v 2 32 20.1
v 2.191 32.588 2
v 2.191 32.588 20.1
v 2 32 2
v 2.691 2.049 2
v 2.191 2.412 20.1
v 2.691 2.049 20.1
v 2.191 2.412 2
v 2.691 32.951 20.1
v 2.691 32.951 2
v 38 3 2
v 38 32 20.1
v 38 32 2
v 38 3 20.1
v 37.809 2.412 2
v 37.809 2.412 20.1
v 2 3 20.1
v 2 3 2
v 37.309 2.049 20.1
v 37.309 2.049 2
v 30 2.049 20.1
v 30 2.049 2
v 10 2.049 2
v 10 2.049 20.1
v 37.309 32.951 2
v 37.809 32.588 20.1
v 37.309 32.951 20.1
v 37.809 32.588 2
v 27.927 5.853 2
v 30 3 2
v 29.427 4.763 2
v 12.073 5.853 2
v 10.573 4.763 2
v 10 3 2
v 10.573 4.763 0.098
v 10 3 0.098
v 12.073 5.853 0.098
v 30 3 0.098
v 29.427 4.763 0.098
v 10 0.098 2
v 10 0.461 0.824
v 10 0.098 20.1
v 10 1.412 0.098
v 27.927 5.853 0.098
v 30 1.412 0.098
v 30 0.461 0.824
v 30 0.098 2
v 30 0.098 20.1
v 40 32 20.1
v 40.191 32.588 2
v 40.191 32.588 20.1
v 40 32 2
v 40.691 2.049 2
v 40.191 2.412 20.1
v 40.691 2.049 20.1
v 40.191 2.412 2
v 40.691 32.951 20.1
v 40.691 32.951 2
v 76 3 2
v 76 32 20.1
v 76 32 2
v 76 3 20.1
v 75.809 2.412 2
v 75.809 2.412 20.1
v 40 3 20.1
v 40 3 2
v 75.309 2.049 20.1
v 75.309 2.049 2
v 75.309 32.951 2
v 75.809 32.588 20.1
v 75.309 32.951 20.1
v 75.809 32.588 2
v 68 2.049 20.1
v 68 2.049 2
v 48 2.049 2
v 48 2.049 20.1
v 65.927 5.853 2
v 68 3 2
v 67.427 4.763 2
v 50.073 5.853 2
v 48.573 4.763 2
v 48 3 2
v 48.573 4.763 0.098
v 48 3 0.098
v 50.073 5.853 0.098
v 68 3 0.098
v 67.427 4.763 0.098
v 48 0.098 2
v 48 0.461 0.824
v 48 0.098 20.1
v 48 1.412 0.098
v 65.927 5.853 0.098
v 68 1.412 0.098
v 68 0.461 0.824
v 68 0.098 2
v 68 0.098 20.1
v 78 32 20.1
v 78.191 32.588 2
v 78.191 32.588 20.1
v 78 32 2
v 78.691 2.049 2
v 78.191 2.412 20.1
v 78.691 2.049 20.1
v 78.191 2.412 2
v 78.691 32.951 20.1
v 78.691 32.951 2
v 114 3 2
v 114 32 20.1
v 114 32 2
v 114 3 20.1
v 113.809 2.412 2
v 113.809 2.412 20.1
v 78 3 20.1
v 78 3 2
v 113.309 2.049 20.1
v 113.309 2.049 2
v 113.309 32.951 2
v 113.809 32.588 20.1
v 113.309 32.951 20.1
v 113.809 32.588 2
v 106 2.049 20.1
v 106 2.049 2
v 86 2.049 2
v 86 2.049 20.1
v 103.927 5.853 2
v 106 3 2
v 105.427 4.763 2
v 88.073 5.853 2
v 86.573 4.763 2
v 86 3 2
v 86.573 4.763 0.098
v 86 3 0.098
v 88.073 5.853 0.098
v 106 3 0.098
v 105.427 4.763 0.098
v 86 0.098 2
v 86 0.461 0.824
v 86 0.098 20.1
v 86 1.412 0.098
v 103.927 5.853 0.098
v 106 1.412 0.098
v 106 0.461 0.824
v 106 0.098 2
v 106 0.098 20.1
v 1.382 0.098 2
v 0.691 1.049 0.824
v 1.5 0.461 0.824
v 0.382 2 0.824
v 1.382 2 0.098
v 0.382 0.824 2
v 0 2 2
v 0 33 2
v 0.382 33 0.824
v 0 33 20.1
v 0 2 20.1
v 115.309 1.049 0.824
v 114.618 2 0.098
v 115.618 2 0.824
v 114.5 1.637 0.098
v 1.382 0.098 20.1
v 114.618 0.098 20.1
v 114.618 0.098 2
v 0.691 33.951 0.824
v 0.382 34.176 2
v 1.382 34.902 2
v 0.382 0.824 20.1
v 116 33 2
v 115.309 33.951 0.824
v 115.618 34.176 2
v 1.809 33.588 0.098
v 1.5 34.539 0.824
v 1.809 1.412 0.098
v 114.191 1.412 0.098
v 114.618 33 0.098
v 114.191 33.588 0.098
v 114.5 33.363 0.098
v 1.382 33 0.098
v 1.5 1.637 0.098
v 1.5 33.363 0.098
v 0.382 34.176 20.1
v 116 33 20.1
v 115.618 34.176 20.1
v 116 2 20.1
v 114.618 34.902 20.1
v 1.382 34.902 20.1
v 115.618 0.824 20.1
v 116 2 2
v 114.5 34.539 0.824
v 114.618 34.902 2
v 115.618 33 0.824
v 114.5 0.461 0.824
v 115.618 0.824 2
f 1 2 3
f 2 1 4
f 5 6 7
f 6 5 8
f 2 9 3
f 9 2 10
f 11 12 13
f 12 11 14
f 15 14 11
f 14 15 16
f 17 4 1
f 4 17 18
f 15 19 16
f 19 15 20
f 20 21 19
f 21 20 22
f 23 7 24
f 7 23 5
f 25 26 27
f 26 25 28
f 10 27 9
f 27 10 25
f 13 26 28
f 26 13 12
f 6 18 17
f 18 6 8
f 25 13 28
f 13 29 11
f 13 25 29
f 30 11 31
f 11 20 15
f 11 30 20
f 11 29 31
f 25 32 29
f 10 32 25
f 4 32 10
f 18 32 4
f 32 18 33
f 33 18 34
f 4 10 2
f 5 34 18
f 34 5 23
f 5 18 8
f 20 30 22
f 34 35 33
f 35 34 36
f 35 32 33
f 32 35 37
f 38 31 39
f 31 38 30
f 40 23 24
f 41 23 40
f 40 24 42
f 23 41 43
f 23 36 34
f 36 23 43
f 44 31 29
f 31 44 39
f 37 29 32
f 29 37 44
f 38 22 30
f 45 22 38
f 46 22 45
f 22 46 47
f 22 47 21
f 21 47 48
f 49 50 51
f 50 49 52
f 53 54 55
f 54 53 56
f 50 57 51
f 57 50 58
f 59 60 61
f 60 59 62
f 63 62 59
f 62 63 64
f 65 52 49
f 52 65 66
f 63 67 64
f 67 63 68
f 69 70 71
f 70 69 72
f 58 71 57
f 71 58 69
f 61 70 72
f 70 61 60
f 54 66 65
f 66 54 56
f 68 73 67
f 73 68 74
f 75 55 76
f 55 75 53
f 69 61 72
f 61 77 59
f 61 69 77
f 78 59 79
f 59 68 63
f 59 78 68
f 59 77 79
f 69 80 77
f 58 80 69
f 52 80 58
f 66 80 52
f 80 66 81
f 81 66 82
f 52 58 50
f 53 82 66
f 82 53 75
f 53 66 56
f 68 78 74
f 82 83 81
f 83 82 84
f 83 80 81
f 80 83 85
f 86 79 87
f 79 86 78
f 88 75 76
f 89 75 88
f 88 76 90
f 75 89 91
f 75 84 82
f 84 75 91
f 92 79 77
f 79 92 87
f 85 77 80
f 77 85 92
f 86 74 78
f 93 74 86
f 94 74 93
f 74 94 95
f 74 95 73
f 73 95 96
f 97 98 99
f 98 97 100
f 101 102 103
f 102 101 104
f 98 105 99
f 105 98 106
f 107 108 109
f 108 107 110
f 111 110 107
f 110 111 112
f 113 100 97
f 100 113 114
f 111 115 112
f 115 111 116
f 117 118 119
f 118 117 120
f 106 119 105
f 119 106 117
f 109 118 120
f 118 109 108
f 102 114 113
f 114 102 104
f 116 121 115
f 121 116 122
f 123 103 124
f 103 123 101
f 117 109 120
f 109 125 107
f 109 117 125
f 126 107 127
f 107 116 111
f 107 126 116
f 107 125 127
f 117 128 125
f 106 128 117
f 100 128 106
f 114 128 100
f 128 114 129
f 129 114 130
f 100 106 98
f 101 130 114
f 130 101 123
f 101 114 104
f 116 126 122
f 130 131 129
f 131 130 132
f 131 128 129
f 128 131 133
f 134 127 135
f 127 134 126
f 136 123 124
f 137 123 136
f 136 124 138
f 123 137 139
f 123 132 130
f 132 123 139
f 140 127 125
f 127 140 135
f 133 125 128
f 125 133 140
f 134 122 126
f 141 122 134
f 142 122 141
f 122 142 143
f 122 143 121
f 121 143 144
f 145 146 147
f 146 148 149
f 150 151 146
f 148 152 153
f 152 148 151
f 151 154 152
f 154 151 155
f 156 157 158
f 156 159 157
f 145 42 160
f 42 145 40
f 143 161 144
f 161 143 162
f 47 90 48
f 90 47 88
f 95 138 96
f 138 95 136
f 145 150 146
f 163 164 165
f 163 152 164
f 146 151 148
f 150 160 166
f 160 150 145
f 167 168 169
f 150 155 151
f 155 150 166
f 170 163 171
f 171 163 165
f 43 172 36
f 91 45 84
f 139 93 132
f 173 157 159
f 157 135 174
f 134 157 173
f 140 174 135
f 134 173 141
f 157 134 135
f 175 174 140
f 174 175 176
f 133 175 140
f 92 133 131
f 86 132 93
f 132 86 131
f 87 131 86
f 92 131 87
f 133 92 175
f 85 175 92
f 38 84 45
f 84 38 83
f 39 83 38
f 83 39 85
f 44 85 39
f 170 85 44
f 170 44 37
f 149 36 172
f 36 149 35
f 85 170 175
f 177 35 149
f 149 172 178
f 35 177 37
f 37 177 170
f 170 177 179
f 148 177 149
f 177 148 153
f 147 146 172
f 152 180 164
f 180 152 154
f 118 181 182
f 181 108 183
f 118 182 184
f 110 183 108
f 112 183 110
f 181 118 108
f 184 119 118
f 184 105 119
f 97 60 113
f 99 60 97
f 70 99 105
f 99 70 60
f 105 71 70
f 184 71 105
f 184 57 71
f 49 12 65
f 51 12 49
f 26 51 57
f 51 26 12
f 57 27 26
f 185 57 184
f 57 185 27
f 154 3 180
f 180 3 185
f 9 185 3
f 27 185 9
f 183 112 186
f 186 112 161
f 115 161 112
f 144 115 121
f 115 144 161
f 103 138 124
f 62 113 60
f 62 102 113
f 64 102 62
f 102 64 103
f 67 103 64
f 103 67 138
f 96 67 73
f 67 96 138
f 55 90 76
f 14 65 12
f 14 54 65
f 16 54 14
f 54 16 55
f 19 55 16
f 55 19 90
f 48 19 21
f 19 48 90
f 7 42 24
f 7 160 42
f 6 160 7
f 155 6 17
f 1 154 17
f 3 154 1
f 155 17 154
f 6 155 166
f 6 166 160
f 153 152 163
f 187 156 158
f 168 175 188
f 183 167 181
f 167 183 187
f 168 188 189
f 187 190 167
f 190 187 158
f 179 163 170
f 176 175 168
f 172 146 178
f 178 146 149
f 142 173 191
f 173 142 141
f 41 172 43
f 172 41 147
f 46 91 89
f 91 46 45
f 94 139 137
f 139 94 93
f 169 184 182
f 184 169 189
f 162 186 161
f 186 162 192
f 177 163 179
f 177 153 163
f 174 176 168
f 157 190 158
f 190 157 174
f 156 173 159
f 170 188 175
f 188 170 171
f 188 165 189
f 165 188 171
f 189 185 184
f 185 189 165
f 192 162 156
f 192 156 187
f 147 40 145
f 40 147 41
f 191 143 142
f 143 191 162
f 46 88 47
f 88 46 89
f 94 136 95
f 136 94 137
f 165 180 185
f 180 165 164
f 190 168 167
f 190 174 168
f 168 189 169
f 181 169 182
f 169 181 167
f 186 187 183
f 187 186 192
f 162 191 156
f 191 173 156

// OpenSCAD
// file: ../../lib/rounded_square.scad
$bleed = 1;
$rounding = 3;

module rounded_square(size, flat_top=false, flat_bottom=false) {
  assert(!(flat_top && flat_bottom), "Flat top and flat bottom are exclusive");

  rounding_height = flat_top || flat_bottom 
    ? $rounding 
    : $rounding * 2;

  offset = flat_bottom ? 0 : $rounding;

  inner_size = [
    size[0] - $rounding * 2,
    size[1] - rounding_height,
  ];

  minkowski() {
    translate([$rounding, offset]) {
      square(inner_size);
    }
    if (flat_top ) {
      difference() {
        circle($rounding);
        translate([-$rounding, 0]) {
          square([$rounding * 2, $rounding]);
        }
      }
    } else if (flat_bottom) {
      difference() {
        circle($rounding);
        translate([-$rounding, -$rounding]) {
          square([$rounding * 2, $rounding]);
        }
      }
    } else {
      circle($rounding);
    }
  }
}
// file: ../../lib/rounded_cube.scad
include <./rounded_square.scad>

$bleed = 1;
$rounding = 3;

// Render a rounded cube
// flat_top: do not round the top edges
// flat_bottom: do not round the bottom edges
// flat: equals flat_top && flat_bottom
// 
// Limitations:
// requires height > $rounding * 2
// flat_top || flat_bottom requires height > $rounding
// flat_top && flat_bottom requires height > $bleed
module rounded_cube(
  size, 
  flat=false, 
  flat_top=false, 
  flat_bottom=false,
  side_rounding=-1
) {
  _flat_top = flat_top || flat;
  _flat_bottom = flat_bottom || flat;
  _side_rounding = side_rounding > -1 ? side_rounding: $rounding;

  top_height = _flat_top ? 0: $rounding;
  bottom_height = _flat_bottom ? 0: $rounding;

  echo ("side rounding:", _side_rounding);
  echo("rounding:", $rounding);

  cube_size = [
    size[0] - $rounding * 2,
    size[1] - $rounding * 2,
    size[2] - (top_height + bottom_height)
  ];

  if (_flat_top && _flat_bottom) {
     linear_extrude(cube_size[2]) {
       rounded_square([size[0], size[1]]);
     }
   } else {
     minkowski() {
       translate([$rounding, $rounding, bottom_height]) {
         if (_side_rounding != $rounding) {
           linear_extrude(cube_size[2]) {
             rounded_square([cube_size[0], cube_size[1]], $rounding=_side_rounding);
           }
         } else {
           cube(cube_size);
         }
       }
       if (_flat_top) {
         difference() {
           sphere($rounding);
           cylinder($rounding, $rounding, $rounding);
         }
       } else if (_flat_bottom) {
         difference() {
           sphere($rounding);
           translate ([0, 0, -$rounding]) {
             cylinder($rounding, $rounding, $rounding);
           }
         }
       } else {
         sphere($rounding);
       }
    }
  }
}
// main file
echo(version=version());

include <../../lib/rounded_cube.scad>

// Config
// $fn = 50;
$fn = 10;
$wall_thickness = 2;
$bleed = 0.01;
tile_gap = 0.5;

tile_cols = 3;
order_tile_count = 8;

order_tile_size = [
  35, 
  30, 
  2.2,
];
order_height = order_tile_size[2] * order_tile_count + tile_gap;

cutout_size = [
  order_tile_size[0] + tile_gap * 2,
  order_tile_size[1] + tile_gap * 2,
  order_height + $bleed,
];

box_size = [
  cutout_size[0] * tile_cols + $wall_thickness * (tile_cols + 1),
  cutout_size[1] + $wall_thickness * 2,
  order_height + $wall_thickness,
];

col_width = cutout_size[0] + $wall_thickness * 2;

cutout_fraction = 0.5;
side_cutout = [
  col_width * cutout_fraction,
  box_size[1] * cutout_fraction,
  box_size[2] + $bleed * 2,
];
side_cutout_width_offset = (col_width - side_cutout[0]) / 2;
side_cutout_length_offset = (box_size[1] - side_cutout[1]) / 2;
inset = 6;

difference() {
  rounded_cube(box_size, flat_top=true, $rounding=2);

  for(i=[0:tile_cols-1]) {
    translate([(cutout_size[0] + $wall_thickness) * i, 0, 0]) {
      // Tile tray
      translate([$wall_thickness, $wall_thickness, $wall_thickness]) {
        rounded_cube(cutout_size, flat=true, $rounding=1);
      }

      // Bottom cutout
      translate([side_cutout_width_offset, -side_cutout[1] + inset, 0]) {
        rounded_cube(side_cutout, flat=true);
      }
    }
  }
}
